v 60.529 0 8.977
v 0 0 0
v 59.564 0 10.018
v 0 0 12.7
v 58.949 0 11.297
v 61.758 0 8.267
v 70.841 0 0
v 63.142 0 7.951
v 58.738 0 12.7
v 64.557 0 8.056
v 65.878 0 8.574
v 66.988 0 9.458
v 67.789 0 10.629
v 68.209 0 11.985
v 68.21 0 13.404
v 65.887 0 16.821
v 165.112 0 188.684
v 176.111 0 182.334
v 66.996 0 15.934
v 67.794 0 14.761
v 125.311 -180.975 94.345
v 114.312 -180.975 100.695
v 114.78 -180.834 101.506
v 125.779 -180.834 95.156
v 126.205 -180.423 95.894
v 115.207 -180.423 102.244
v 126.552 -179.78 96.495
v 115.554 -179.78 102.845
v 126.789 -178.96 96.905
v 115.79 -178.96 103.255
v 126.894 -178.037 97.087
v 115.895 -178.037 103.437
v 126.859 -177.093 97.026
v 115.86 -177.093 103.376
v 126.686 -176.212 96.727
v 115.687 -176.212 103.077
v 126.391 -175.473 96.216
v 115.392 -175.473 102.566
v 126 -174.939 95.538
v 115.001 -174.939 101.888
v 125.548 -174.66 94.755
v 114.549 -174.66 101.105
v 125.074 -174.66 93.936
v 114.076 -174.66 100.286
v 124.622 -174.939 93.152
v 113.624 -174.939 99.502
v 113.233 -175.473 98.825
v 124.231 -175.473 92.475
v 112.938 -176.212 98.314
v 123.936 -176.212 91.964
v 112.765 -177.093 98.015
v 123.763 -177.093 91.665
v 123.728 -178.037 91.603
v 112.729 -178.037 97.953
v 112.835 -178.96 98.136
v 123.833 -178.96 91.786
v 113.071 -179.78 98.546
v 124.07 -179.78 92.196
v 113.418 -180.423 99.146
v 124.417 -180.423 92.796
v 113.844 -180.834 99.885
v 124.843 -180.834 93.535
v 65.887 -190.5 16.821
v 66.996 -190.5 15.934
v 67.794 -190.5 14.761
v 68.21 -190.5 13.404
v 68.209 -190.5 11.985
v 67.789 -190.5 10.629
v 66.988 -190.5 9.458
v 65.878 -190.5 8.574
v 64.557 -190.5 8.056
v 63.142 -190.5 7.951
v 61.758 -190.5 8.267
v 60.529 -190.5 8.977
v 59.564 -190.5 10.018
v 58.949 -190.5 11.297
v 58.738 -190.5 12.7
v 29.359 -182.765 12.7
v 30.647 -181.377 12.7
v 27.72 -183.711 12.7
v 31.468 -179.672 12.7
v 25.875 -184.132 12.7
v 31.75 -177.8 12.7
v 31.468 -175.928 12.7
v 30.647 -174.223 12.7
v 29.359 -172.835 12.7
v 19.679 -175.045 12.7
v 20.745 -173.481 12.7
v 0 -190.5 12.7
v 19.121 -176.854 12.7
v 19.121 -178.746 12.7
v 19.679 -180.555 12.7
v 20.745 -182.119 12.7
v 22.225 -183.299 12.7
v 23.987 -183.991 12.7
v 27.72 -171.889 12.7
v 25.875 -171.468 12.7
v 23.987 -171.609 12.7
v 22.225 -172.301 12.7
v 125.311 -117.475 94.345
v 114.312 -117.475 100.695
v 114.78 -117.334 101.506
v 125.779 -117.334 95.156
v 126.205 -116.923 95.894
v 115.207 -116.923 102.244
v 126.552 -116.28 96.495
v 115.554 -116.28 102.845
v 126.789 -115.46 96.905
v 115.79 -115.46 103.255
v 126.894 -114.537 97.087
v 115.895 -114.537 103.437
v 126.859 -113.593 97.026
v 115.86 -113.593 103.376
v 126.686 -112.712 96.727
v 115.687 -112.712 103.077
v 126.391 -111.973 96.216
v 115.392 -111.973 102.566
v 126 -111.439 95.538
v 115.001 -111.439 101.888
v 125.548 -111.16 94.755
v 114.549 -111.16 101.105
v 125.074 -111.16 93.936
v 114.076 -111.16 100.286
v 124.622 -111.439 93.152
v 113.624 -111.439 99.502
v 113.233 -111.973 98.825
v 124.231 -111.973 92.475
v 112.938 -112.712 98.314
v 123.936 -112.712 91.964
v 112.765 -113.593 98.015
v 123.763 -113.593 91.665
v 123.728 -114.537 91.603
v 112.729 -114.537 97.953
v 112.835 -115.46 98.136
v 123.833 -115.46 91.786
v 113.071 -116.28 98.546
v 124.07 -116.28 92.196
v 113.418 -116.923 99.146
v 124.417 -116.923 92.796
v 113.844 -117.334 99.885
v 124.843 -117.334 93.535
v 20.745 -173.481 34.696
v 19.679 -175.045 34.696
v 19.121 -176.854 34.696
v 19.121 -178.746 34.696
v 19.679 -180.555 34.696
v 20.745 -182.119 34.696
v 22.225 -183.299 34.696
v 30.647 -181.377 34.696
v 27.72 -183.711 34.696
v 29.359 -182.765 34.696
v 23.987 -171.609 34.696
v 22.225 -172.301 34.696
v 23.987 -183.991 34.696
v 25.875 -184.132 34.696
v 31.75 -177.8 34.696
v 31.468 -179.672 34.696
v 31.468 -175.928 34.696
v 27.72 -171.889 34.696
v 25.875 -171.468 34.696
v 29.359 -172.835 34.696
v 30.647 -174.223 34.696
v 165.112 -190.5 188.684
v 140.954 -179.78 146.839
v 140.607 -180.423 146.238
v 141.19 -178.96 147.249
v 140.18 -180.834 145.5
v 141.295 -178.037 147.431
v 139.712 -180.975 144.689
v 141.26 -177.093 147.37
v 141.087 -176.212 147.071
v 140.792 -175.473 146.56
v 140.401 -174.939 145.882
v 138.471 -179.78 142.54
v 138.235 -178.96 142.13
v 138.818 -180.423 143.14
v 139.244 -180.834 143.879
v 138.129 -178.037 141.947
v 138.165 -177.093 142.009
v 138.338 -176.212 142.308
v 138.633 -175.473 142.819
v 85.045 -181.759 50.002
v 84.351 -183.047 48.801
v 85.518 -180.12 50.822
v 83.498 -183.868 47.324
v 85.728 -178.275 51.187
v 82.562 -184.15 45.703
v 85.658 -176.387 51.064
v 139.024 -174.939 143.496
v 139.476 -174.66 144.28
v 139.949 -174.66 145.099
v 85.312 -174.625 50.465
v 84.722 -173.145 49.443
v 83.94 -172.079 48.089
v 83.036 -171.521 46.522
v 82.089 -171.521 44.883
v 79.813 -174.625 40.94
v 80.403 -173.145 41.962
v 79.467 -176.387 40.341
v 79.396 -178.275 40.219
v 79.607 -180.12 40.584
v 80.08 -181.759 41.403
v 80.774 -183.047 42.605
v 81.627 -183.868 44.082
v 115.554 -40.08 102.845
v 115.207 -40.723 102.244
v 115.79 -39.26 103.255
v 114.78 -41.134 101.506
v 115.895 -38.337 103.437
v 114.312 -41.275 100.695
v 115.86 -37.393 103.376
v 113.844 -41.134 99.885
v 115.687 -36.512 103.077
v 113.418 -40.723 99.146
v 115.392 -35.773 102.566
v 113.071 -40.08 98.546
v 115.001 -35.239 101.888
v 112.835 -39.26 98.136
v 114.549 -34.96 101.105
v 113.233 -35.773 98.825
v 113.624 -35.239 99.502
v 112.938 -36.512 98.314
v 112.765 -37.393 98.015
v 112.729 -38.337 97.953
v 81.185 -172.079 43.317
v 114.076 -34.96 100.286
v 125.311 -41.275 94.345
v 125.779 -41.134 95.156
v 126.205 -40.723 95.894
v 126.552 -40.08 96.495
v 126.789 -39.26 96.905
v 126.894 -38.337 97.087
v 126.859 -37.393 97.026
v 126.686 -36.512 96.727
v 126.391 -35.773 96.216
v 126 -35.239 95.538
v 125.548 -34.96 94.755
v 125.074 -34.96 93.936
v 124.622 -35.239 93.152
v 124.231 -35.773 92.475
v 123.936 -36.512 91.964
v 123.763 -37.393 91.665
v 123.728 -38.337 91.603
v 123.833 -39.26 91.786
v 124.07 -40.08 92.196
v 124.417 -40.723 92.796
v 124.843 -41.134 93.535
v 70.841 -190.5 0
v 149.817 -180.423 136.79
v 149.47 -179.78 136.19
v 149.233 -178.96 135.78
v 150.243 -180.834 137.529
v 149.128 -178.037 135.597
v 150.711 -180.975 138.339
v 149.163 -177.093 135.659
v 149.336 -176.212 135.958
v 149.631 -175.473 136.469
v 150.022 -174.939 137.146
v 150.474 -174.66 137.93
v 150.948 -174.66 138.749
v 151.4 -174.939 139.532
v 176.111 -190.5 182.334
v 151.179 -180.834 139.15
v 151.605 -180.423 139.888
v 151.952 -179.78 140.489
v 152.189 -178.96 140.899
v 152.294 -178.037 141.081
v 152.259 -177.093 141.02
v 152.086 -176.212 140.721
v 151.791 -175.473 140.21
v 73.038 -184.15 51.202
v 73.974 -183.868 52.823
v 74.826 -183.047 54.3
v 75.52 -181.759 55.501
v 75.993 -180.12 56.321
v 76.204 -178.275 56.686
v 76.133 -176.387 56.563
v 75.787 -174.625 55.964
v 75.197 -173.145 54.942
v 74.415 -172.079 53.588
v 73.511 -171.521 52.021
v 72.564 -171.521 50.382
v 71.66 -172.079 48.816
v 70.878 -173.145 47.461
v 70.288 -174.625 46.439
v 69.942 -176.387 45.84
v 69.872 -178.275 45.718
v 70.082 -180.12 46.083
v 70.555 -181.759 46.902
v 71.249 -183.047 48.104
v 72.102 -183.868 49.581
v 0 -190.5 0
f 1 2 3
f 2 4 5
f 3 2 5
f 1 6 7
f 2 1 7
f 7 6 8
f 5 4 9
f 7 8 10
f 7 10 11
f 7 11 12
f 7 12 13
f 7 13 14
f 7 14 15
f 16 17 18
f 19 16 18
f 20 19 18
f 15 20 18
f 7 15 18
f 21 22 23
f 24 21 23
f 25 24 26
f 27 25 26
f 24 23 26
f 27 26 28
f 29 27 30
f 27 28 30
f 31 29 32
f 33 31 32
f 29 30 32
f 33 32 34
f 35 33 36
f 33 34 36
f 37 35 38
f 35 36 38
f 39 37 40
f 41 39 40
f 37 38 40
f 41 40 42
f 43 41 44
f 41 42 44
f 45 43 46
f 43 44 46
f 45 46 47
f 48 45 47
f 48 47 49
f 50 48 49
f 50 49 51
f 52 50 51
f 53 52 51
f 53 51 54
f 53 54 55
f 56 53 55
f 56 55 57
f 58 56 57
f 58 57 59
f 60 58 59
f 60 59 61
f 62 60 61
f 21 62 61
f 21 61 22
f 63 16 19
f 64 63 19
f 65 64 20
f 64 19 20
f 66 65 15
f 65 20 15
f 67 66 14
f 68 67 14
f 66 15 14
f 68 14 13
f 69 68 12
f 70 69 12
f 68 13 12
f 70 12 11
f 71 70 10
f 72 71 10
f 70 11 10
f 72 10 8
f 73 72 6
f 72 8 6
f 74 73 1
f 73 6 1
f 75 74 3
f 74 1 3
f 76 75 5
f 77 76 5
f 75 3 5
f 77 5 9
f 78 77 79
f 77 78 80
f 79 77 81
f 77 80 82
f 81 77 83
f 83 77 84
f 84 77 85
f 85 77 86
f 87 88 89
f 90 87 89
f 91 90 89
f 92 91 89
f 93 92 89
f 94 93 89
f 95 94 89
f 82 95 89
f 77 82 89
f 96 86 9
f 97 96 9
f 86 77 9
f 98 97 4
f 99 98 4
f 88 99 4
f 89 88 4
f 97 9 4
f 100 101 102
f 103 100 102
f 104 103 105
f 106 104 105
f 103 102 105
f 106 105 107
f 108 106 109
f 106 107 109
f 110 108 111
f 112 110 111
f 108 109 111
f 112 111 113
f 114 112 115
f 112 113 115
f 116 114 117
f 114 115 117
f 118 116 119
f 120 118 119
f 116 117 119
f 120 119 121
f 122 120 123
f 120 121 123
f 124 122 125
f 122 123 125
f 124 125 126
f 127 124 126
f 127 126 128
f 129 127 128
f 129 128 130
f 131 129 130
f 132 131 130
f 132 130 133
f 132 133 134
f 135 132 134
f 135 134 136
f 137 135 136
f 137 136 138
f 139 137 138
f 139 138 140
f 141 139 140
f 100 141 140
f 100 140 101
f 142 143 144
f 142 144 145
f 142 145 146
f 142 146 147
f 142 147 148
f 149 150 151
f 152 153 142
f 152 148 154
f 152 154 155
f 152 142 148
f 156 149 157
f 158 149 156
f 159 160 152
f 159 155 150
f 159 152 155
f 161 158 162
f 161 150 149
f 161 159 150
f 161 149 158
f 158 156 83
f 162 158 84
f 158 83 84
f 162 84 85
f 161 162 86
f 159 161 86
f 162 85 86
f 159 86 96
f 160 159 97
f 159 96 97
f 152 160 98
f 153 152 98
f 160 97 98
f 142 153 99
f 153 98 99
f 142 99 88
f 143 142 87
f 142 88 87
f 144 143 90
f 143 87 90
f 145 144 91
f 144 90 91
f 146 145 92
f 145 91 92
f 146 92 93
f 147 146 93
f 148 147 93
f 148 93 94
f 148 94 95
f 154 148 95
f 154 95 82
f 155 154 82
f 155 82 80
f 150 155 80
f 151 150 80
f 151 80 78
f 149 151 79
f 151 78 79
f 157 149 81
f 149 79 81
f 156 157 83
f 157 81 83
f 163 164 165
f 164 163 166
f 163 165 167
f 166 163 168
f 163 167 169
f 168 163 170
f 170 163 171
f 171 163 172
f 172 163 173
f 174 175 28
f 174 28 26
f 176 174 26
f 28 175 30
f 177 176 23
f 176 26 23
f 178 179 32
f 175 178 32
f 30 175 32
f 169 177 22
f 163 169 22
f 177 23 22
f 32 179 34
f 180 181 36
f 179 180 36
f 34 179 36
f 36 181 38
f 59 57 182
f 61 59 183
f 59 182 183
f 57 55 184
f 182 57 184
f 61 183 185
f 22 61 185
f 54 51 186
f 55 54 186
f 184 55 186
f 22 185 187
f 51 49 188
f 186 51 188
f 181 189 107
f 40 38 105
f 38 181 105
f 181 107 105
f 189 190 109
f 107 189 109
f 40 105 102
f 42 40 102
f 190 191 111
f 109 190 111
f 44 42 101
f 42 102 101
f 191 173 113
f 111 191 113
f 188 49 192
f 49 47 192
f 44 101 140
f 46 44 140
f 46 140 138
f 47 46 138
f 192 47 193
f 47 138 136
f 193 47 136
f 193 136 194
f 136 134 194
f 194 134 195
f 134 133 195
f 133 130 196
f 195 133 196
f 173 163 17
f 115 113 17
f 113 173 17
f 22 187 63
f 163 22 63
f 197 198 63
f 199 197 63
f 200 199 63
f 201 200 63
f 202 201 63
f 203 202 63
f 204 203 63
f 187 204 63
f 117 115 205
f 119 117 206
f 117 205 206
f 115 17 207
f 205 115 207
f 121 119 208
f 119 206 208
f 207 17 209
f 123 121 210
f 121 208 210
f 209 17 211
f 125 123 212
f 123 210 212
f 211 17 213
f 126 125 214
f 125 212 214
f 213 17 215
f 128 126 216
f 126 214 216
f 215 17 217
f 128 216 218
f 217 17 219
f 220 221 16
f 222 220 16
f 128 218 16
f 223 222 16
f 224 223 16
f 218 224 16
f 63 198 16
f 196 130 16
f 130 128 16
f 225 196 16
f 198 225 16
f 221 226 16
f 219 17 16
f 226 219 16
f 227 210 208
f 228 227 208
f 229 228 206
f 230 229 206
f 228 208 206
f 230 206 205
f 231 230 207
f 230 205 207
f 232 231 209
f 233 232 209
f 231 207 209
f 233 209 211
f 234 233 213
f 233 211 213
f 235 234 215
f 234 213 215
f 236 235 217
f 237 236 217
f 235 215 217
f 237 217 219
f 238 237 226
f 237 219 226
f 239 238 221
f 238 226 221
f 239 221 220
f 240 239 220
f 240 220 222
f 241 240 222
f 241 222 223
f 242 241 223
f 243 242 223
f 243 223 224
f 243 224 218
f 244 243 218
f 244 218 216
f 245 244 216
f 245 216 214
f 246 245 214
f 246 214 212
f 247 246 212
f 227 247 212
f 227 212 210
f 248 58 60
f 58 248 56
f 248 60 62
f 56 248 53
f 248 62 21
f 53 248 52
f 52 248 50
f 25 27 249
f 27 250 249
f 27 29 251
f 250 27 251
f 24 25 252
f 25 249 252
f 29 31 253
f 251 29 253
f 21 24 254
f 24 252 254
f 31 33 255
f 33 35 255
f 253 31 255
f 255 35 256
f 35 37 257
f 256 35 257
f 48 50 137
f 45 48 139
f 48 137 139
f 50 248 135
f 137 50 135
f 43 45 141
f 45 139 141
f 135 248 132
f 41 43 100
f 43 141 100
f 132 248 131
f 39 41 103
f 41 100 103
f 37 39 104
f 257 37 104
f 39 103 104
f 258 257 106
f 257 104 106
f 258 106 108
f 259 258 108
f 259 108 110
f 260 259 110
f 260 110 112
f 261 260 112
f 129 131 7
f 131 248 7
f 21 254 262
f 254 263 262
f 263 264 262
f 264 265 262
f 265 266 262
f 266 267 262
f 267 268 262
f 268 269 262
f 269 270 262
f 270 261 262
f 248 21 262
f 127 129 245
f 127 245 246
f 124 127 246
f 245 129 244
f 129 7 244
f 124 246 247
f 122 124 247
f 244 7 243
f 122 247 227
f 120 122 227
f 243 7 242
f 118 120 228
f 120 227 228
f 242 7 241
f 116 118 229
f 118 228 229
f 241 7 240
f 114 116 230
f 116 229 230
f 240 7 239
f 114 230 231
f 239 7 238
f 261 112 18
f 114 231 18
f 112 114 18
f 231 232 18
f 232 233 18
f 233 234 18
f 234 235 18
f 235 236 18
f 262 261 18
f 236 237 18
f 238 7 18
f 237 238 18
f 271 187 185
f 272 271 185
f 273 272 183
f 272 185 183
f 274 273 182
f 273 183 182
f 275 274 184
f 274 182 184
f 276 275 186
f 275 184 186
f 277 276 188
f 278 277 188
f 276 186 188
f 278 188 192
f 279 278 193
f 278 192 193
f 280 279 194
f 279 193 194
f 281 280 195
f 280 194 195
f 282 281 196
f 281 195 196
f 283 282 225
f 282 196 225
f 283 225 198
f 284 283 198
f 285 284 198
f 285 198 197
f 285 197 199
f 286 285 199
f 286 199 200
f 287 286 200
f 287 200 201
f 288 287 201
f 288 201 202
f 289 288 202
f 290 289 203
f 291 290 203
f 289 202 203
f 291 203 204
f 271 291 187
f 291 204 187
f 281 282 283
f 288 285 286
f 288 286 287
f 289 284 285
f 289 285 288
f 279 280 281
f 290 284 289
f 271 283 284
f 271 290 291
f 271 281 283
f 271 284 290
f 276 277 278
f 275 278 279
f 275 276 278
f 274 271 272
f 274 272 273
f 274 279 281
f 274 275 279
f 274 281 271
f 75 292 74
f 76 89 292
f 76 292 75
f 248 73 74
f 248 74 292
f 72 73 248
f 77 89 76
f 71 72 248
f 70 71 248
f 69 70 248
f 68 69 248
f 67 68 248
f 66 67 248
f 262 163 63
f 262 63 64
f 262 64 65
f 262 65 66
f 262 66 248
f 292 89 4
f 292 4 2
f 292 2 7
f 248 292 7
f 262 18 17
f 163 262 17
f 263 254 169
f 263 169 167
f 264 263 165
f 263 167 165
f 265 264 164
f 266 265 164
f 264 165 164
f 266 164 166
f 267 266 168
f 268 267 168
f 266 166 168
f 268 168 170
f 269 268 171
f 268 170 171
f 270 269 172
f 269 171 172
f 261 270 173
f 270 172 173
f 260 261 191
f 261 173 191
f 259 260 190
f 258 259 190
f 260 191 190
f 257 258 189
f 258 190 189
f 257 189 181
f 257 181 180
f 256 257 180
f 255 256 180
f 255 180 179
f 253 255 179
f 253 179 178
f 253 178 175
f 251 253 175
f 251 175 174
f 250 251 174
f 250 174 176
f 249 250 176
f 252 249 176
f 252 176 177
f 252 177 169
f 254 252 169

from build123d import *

# Parameters (mm, degrees)
F1_DEPTH = 190.5
F2_R     = 3.175
F3_DEPTH = 25.4
F4_R     = 6.35
F5_DEPTH = 10.9982
F6_R     = 6.35
F7_DEPTH = 21.9964


with BuildPart() as f1:
    # F0 (on Front) → F1 (new body)
    with BuildSketch(Plane.XZ):
        with BuildLine():
            Line((0, 12.7), (0, 0))
            Line((0, 0), (70.8406, 0))
            Line((70.8406, 0), (176.1109, 182.333508128))
            Line((176.1109, 182.333508128), (165.1123773719, 188.683508128))
            Line((165.1123773719, 188.683508128), (65.8874360053, 16.820868303))
            ThreePointArc((65.8874360053, 16.820868303), (65.878154986, 8.573768655), (58.7375, 12.7))
            Line((58.7375, 12.7), (0, 12.7))
        make_face()
    extrude(amount=F1_DEPTH)

    # F2 (on face) → F3 (cut)
    with BuildSketch(Plane(origin=(42.1319273719, 0, -24.3248796097), x_dir=(0, -1, 0), z_dir=(-0.8660254038, 0, 0.5))):
        with Locations((38.1, 144.3609)):
            Circle(F2_R)
        with Locations((114.3, 144.3609)):
            Circle(F2_R)
        with Locations((177.8, 144.3609)):
            Circle(F2_R)
        with Locations((177.8, 195.1609)):
            Circle(F2_R)
    extrude(amount=-F3_DEPTH, mode=Mode.SUBTRACT)

    # F4 (on face) → F5 (join)
    with BuildSketch(Plane(origin=(42.1319273719, 0, -24.3248796097), x_dir=(0, -1, 0), z_dir=(-0.8660254038, 0, 0.5))):
        with Locations((177.8, 80.8609)):
            Circle(F4_R)
    extrude(amount=F5_DEPTH)

    # F6 (on face) → F7 (join)
    with BuildSketch(Plane.XY.offset(12.7)):
        with Locations((25.4, -177.8)):
            Circle(F6_R)
    extrude(amount=F7_DEPTH)


solid = f1.part
